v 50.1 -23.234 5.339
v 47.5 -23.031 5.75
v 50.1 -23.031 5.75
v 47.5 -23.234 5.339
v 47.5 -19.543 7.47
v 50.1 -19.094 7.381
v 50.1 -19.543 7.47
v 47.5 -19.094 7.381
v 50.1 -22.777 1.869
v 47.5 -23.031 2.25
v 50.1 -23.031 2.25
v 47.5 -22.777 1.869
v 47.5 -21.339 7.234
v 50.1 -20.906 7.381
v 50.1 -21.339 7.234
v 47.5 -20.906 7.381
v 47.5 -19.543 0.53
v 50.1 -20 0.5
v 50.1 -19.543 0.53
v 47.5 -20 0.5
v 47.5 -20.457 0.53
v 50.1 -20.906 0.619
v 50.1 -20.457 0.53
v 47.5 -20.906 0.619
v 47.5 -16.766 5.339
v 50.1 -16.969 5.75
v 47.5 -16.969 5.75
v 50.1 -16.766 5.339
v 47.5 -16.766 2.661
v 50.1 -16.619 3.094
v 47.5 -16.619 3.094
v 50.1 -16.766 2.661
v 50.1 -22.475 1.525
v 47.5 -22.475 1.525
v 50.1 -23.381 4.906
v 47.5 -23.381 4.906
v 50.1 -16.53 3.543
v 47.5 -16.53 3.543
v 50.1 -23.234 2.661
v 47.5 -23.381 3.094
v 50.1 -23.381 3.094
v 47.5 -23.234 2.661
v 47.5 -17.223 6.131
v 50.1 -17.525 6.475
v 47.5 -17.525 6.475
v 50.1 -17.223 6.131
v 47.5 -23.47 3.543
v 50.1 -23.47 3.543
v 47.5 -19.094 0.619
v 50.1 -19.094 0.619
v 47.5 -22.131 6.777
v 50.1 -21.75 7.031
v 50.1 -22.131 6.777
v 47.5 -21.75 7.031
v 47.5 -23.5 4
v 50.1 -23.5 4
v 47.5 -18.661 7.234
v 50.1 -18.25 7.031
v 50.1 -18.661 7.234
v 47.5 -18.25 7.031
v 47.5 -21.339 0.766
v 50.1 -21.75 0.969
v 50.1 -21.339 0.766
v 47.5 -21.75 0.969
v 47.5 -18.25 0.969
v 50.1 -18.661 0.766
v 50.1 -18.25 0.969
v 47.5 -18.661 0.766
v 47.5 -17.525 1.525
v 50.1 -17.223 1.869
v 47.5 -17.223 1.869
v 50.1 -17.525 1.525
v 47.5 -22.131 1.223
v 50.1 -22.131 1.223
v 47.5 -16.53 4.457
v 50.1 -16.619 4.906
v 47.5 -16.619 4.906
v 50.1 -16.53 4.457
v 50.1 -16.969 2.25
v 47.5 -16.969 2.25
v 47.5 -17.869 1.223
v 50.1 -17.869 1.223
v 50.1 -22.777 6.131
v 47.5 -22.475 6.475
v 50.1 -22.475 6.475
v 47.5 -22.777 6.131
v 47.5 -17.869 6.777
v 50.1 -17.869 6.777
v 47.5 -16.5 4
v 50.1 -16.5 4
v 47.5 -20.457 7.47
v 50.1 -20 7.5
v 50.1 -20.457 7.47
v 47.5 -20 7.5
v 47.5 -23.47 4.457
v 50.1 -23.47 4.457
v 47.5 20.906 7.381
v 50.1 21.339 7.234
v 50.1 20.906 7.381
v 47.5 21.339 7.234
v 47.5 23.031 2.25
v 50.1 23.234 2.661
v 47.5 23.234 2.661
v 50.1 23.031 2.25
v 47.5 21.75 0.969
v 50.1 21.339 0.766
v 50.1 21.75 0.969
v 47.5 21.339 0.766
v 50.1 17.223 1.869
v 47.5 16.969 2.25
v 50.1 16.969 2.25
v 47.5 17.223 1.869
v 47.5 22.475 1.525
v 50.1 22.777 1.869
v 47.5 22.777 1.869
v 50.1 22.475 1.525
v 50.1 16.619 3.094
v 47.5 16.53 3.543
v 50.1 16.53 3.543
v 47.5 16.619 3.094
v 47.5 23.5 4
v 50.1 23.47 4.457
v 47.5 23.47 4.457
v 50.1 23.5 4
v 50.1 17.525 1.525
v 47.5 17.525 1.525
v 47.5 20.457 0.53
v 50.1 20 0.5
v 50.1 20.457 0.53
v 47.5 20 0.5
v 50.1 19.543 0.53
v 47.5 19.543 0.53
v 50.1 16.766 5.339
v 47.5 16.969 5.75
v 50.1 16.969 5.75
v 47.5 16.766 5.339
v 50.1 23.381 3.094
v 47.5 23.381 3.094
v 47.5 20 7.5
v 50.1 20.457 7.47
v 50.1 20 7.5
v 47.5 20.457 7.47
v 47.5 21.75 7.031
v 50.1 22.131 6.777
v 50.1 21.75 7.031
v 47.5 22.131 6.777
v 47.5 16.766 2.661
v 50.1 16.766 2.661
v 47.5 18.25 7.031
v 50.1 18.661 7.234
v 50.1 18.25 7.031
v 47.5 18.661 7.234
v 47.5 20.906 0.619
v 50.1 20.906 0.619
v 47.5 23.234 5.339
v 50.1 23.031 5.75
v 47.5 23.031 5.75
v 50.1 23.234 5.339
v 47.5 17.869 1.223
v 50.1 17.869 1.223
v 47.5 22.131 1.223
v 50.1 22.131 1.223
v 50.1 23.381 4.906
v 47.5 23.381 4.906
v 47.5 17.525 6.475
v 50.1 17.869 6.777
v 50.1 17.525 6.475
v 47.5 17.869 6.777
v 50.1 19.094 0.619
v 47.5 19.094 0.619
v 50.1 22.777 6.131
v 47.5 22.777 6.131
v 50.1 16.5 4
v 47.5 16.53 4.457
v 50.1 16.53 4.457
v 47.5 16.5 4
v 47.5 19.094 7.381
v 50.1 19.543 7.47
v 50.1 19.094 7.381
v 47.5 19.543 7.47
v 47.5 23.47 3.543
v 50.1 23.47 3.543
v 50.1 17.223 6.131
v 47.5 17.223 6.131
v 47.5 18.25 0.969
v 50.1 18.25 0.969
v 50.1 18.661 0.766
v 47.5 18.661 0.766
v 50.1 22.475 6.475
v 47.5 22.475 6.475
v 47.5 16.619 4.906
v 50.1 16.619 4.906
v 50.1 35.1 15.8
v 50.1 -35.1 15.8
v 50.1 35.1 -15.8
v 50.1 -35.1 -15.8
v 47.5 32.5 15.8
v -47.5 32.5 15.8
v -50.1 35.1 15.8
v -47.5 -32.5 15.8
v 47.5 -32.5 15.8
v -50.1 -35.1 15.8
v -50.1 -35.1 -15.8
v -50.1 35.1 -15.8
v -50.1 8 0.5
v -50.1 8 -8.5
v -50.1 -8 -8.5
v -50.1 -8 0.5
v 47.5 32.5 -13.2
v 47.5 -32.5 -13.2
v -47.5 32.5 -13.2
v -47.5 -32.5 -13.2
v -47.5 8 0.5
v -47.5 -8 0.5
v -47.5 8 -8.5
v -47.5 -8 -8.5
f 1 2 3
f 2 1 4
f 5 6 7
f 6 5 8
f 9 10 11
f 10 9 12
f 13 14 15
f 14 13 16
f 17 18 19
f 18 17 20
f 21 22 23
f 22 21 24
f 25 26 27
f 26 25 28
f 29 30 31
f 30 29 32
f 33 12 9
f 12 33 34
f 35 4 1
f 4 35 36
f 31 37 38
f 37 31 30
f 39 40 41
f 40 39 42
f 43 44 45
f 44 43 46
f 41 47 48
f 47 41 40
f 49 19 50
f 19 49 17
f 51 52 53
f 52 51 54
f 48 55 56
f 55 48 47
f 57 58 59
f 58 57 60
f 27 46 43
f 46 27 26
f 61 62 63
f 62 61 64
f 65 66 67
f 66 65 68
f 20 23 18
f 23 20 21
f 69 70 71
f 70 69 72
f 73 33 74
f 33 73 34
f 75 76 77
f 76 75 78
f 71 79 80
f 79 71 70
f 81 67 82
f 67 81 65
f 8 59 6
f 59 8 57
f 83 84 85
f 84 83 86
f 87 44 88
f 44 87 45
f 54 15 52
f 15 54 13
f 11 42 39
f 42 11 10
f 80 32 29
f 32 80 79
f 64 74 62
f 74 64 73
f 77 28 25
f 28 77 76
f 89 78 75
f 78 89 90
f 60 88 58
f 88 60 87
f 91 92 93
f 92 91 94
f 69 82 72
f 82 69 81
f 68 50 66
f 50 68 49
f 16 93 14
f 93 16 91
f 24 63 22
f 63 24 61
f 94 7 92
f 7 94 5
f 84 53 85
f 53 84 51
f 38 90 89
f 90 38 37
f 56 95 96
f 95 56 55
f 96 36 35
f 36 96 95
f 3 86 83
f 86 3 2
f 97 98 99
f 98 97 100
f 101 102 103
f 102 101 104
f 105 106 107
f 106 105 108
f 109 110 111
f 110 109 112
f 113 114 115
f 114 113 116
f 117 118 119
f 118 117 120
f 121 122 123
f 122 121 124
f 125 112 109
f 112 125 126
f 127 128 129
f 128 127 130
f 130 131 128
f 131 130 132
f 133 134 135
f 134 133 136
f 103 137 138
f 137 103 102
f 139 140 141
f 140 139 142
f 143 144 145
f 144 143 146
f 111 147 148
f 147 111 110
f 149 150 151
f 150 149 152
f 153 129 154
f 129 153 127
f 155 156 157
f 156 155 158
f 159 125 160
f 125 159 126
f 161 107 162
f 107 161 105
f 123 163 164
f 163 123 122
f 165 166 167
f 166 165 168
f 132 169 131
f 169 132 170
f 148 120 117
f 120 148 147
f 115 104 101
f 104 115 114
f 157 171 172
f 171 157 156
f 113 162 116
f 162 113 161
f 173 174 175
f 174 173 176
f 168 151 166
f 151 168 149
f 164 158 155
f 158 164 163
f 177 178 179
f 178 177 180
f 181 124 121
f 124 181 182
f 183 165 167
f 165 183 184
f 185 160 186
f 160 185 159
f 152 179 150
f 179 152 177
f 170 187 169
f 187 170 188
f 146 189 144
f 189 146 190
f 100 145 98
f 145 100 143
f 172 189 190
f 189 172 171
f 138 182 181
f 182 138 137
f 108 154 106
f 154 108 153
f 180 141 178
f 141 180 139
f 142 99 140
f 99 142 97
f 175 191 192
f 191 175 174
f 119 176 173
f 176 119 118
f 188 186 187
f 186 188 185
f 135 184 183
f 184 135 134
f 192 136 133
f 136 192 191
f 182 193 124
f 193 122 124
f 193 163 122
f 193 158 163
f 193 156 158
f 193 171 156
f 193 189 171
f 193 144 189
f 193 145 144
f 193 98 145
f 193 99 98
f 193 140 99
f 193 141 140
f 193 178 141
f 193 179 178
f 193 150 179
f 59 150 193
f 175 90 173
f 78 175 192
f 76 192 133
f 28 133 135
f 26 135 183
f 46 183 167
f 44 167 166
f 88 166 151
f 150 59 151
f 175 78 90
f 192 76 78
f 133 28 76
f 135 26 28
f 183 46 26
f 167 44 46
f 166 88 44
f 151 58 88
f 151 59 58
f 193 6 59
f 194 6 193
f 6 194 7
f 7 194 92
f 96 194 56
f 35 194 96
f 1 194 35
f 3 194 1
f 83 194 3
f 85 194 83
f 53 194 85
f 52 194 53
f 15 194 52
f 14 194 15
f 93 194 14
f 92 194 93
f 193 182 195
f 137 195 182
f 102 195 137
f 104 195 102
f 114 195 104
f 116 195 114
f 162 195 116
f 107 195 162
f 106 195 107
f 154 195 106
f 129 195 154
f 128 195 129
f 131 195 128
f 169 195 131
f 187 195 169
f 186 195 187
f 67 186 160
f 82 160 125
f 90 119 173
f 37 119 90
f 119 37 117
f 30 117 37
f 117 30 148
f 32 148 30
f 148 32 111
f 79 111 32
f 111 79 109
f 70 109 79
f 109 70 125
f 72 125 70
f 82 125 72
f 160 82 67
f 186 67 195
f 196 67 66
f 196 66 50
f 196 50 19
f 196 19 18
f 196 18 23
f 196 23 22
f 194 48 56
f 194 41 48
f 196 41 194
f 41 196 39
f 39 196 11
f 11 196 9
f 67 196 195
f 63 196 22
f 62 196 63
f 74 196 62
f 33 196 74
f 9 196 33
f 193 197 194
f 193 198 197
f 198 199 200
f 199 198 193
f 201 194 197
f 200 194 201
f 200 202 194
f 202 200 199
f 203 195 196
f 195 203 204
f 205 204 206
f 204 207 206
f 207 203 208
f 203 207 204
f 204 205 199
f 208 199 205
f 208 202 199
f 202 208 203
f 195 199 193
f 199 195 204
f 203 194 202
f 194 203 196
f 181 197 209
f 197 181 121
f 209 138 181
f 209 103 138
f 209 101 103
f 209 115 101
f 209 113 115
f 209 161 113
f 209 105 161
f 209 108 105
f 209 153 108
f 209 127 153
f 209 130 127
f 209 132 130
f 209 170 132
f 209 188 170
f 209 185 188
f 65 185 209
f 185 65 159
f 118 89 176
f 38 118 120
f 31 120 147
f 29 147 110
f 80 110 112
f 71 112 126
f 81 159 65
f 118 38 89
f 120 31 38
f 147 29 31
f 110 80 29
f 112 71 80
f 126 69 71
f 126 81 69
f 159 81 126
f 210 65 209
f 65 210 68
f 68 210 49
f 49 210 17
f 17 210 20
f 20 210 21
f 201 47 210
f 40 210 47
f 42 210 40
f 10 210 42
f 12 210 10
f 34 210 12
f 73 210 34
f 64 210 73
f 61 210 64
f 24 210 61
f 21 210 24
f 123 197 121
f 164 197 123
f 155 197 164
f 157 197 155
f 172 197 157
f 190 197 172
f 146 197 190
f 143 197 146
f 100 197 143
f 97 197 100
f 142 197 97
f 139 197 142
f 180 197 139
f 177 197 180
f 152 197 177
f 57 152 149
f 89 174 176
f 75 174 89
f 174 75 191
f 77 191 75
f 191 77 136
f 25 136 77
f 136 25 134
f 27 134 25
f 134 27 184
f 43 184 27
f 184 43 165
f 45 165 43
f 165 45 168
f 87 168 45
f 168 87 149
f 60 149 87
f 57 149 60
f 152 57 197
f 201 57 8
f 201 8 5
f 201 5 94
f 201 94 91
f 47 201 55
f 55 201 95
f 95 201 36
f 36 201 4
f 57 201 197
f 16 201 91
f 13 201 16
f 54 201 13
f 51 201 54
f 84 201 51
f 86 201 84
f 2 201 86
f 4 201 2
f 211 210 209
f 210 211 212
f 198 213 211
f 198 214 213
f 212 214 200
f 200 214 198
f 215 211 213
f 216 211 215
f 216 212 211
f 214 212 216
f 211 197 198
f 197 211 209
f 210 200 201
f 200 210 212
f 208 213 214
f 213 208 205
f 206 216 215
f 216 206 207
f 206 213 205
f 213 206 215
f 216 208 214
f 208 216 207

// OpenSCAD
// 参数化中继节点外壳。双天线孔和散热槽，打印前必须复核实物。
$fn = 48;
board = [92, 62, 24];
wall = 2.6;
clearance = 1.5;
outer = [board.x + 2*(wall+clearance), board.y + 2*(wall+clearance), board.z + wall + 5];

difference() {
  cube(outer, center=true);
  translate([0,0,wall]) cube([outer.x-2*wall,outer.y-2*wall,outer.z],center=true);
  for(y=[-20,20]) translate([outer.x/2,y,4]) rotate([0,90,0]) cylinder(h=wall*3,d=7,center=true); // 天线
  translate([-outer.x/2,0,-4]) cube([wall*3,16,9],center=true); // USB/网口
  for(x=[-32:-8:32]) translate([x,outer.y/2,5]) rotate([90,0,0]) cube([4,12,wall*3],center=true);
}
